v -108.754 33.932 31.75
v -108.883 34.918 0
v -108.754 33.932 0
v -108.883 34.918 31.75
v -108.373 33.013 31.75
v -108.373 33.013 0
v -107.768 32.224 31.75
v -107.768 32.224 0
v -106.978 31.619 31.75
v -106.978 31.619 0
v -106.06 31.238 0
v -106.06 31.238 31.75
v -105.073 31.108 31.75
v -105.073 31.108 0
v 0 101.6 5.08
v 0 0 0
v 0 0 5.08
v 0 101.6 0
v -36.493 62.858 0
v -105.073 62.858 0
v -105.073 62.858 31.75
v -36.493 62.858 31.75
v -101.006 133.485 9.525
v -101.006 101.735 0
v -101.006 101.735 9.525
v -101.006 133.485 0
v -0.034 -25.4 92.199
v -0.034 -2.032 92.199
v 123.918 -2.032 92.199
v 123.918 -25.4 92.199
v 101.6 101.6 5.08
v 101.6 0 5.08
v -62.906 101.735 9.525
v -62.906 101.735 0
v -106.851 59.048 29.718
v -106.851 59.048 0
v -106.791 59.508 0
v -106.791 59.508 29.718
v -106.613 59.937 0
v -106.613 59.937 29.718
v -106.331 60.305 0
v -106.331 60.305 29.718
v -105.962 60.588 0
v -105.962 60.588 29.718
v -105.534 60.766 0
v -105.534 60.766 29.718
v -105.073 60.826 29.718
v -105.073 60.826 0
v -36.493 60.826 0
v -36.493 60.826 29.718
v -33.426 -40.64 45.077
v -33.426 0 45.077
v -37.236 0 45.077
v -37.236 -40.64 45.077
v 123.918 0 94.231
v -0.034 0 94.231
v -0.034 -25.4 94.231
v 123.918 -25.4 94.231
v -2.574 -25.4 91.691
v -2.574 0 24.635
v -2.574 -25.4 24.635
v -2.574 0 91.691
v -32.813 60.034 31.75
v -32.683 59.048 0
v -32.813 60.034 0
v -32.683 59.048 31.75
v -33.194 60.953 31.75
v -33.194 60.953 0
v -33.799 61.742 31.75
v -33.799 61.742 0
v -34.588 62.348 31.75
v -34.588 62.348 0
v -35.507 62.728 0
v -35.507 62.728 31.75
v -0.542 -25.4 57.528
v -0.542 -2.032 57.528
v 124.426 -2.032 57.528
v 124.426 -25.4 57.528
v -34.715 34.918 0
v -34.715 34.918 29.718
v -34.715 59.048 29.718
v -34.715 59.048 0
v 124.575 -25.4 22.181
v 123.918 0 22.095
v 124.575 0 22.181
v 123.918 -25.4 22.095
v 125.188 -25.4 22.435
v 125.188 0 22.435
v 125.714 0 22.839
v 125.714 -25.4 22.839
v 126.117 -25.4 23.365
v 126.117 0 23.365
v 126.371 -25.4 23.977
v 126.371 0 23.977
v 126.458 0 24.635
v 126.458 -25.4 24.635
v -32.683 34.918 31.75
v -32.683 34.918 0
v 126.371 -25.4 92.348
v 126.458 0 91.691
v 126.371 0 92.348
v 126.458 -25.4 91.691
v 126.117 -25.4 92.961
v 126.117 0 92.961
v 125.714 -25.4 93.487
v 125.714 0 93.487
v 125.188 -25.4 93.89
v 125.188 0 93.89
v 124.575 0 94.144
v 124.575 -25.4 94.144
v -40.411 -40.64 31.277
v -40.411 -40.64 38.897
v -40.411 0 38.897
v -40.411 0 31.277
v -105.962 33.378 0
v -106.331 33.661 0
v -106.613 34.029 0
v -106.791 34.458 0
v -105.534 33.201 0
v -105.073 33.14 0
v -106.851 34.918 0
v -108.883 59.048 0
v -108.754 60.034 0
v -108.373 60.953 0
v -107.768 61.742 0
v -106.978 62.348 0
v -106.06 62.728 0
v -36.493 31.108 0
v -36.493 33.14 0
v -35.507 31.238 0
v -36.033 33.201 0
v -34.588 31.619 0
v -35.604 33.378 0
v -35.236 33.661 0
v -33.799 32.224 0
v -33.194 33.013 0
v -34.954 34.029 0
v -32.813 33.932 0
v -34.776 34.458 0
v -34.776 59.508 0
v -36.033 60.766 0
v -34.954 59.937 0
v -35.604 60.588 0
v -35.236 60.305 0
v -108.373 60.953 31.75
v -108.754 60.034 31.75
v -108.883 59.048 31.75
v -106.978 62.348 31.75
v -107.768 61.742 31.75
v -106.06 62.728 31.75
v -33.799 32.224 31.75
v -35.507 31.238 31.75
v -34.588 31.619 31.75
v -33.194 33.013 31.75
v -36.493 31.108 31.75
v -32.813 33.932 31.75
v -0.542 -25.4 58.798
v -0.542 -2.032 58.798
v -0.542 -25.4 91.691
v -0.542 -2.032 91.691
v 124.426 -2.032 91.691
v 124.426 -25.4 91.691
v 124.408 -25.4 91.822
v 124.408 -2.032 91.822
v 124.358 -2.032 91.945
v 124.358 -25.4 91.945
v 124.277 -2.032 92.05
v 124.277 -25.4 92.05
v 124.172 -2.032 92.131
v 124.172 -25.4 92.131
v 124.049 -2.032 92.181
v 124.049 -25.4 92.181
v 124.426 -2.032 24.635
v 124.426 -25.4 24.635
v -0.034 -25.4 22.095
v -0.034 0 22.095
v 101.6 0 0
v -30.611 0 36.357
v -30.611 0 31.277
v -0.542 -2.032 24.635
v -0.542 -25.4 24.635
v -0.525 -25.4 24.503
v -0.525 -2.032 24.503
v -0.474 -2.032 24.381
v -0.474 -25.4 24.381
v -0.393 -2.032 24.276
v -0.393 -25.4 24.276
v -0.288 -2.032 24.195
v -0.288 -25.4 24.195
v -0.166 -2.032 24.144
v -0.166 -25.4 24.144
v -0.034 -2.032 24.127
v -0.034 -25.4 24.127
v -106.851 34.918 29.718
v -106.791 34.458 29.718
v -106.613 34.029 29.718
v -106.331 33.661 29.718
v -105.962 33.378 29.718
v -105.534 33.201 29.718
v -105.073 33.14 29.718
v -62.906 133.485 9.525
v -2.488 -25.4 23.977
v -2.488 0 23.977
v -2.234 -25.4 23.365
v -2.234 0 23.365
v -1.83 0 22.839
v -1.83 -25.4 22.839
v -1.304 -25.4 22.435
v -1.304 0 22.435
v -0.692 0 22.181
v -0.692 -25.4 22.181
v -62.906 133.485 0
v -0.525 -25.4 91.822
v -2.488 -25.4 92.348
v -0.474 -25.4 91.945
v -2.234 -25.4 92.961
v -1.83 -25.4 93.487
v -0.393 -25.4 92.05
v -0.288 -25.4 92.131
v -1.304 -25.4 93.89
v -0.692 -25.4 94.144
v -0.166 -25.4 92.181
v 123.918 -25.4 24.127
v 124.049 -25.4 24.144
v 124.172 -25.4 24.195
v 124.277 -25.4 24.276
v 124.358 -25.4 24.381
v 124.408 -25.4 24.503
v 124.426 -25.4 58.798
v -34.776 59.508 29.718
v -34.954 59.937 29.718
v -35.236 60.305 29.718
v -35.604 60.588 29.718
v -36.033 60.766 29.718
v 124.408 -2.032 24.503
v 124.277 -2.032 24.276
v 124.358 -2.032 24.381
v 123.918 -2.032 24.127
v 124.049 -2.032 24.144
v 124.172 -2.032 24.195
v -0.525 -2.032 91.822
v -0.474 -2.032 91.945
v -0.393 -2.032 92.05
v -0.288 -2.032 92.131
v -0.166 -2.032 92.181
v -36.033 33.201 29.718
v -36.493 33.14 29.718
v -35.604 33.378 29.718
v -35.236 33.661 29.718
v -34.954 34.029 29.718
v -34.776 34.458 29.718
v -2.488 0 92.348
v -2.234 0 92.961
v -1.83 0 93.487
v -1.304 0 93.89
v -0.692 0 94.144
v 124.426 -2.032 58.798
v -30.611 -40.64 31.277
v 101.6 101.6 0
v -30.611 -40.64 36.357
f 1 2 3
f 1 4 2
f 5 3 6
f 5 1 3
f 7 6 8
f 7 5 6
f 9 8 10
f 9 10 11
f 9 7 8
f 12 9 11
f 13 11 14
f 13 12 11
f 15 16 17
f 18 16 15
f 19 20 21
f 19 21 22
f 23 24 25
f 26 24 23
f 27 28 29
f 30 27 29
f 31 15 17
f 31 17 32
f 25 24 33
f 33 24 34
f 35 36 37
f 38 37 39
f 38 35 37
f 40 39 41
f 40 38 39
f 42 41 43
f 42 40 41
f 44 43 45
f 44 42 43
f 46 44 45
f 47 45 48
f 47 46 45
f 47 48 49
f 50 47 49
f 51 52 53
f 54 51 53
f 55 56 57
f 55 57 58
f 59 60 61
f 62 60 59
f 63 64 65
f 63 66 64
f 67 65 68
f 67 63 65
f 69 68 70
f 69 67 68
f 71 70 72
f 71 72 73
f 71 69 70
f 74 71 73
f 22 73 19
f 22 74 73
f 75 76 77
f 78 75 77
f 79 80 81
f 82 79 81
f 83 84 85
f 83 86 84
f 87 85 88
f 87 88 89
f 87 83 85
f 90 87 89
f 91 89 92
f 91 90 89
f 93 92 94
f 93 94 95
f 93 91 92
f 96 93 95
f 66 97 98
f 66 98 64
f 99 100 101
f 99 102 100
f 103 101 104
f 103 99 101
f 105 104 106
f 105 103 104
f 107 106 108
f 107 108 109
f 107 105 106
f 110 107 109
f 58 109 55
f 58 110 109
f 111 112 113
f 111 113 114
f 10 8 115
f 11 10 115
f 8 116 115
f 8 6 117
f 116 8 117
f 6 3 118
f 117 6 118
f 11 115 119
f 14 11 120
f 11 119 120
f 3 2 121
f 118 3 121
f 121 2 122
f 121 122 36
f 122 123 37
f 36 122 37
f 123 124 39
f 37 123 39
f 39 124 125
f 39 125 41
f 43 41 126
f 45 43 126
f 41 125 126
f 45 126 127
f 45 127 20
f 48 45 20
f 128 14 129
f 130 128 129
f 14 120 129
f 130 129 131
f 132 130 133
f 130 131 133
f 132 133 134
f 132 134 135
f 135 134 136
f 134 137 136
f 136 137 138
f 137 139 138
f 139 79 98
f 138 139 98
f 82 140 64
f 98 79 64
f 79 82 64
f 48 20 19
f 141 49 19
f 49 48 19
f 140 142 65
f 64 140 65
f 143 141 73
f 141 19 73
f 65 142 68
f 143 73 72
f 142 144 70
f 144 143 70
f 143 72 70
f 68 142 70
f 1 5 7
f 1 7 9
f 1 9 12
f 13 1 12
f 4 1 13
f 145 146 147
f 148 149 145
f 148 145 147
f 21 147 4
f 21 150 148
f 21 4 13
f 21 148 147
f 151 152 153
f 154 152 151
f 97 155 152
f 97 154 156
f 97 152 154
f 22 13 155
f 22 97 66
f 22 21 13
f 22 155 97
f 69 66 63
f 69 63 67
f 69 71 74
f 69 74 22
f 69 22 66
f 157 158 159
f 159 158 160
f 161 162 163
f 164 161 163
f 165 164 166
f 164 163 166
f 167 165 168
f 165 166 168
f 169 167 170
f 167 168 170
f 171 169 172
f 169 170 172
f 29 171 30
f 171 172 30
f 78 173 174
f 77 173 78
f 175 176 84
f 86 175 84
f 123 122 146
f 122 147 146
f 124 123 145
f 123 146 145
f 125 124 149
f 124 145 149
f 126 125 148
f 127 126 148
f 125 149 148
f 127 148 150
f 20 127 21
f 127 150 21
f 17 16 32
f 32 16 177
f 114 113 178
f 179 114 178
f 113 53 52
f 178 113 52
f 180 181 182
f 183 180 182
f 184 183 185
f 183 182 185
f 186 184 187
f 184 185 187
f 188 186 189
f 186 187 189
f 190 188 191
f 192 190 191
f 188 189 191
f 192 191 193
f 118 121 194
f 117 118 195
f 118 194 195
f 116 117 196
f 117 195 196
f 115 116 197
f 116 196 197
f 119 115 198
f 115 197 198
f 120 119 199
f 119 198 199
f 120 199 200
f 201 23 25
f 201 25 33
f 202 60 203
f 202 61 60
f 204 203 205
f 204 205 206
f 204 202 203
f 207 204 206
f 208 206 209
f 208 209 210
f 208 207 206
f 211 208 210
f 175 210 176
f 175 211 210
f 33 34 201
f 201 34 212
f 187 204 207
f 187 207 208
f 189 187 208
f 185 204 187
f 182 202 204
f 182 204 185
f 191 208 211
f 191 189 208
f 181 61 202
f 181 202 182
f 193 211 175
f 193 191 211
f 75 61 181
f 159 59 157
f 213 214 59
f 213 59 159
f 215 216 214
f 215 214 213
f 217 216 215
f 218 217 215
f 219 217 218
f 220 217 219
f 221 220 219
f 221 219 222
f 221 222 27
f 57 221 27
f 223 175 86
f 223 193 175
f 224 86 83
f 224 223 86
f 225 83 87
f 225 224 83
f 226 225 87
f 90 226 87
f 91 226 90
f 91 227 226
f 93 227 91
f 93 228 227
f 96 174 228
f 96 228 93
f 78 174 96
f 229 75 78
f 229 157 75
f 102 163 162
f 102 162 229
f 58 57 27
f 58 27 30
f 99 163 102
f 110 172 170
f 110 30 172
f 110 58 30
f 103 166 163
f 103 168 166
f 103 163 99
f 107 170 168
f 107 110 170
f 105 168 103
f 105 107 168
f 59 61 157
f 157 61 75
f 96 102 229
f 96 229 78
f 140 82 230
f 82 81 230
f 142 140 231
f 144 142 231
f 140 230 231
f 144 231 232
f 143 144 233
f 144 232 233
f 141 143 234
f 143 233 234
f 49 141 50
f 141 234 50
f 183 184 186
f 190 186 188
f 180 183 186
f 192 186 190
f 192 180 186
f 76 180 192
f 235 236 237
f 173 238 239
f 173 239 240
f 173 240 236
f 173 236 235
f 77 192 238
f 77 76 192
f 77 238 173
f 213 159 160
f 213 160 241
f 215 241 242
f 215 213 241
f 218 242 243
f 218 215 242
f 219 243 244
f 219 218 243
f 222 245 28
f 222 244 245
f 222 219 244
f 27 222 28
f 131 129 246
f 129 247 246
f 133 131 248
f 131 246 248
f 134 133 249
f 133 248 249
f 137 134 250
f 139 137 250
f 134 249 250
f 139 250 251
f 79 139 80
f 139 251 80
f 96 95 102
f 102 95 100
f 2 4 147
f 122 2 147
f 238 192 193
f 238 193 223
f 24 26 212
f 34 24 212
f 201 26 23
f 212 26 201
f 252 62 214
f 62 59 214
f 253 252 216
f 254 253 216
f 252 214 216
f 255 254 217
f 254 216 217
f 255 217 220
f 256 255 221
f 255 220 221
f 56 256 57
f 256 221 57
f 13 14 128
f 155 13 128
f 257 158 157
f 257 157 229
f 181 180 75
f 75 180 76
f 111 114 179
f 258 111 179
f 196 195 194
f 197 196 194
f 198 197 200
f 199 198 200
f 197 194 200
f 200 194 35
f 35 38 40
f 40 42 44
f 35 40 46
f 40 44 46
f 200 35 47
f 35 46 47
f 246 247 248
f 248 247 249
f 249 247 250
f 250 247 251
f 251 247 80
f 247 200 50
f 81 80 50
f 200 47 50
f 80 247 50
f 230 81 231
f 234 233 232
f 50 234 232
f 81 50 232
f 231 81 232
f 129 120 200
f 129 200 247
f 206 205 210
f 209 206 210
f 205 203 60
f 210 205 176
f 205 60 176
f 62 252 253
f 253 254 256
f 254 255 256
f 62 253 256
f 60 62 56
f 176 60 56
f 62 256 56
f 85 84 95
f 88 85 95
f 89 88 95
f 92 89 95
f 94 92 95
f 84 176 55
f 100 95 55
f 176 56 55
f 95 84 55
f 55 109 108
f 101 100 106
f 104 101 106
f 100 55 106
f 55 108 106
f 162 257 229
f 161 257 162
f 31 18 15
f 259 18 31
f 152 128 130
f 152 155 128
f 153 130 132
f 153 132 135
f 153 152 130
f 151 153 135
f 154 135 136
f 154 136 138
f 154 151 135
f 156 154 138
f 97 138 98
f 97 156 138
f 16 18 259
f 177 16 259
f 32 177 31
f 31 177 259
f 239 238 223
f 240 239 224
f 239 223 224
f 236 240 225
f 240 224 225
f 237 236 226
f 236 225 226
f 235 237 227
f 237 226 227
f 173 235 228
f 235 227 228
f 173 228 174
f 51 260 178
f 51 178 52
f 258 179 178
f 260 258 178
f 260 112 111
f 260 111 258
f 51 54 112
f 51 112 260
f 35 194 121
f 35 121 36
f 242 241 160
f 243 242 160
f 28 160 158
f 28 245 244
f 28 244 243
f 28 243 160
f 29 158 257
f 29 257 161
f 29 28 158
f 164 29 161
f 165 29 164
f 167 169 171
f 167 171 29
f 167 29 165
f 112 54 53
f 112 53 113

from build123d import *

# Parameters (mm, degrees)
F0_W      = 101.6
F0_H      = 101.6
F1_DEPTH  = 5.08
F3_DEPTH  = 40.64
F4_W      = 129.032
F4_H      = 72.136
F5_DEPTH  = 25.4
F6_R      = 2.54
F7_T      = -2.032
F8_W      = 124.968
F8_H      = 1.27
F9_DEPTH  = 23.368
F10_W     = 76.2
F10_H     = 31.75
F11_DEPTH = 31.75
F12_R     = 3.81
F13_T     = -2.032
F14_W     = 38.1
F14_H     = 31.75
F15_DEPTH = 9.525


with BuildPart() as f1:
    # F0 (on Top) → F1 (new body)
    with BuildSketch(Plane.XY):
        with Locations((50.8, 50.8)):
            Rectangle(F0_W, F0_H)
    extrude(amount=F1_DEPTH)


with BuildPart() as f3:
    # F2 (on Front) → F3 (new body)
    with BuildSketch(Plane.XZ):
        Polygon((-40.410629, 38.897461), (-40.410629, 31.277461), (-30.610629, 31.277461), (-30.610629, 36.357461), (-33.425629, 45.077461), (-37.235629, 45.077461), align=None)
    extrude(amount=F3_DEPTH)


with BuildPart() as f5:
    # F4 (on Front) → F5 (new body)
    with BuildSketch(Plane.XZ):
        with Locations((61.94177, 58.162778)):
            Rectangle(F4_W, F4_H)
    extrude(amount=F5_DEPTH)

    # F6
    f6_edges = [f5.edges().sort_by_distance(p)[0] for p in [
        (-2.57423, -12.7, 22.094778),
        (-2.57423, -12.7, 94.230778),
        (126.45777, -12.7, 22.094778),
        (126.45777, -12.7, 94.230778),
    ]]
    fillet(f6_edges, radius=F6_R)

    # F7
    f7_openings = [f5.faces().sort_by_distance(p)[0] for p in [
        (61.94177, -25.4, 58.162778),
    ]]
    offset(amount=F7_T, openings=f7_openings)

    # F8 (on face) → F9 (join, through all)
    with BuildSketch(Plane.XZ.offset(2.032)):
        with Locations((61.94177, 58.162778)):
            Rectangle(F8_W, F8_H)
    extrude(amount=F9_DEPTH)


with BuildPart() as f11:
    # F10 (on Top) → F11 (new body)
    with BuildSketch(Plane.XY):
        with Locations((-70.783477, 46.98319)):
            Rectangle(F10_W, F10_H)
    extrude(amount=F11_DEPTH)

    # F12
    f12_edges = [f11.edges().sort_by_distance(p)[0] for p in [
        (-108.883477, 31.10819, 15.875),
        (-108.883477, 62.85819, 15.875),
        (-32.683477, 62.85819, 15.875),
        (-32.683477, 31.10819, 15.875),
    ]]
    fillet(f12_edges, radius=F12_R)

    # F13
    f13_openings = [f11.faces().sort_by_distance(p)[0] for p in [
        (-70.783477, 46.98319, 0),
    ]]
    offset(amount=F13_T, openings=f13_openings)


with BuildPart() as f15:
    # F14 (on Top) → F15 (new body)
    with BuildSketch(Plane.XY):
        with Locations((-81.955737, 117.609583)):
            Rectangle(F14_W, F14_H)
    extrude(amount=F15_DEPTH)


solid = Compound([f1.part, f3.part, f5.part, f11.part, f15.part])
